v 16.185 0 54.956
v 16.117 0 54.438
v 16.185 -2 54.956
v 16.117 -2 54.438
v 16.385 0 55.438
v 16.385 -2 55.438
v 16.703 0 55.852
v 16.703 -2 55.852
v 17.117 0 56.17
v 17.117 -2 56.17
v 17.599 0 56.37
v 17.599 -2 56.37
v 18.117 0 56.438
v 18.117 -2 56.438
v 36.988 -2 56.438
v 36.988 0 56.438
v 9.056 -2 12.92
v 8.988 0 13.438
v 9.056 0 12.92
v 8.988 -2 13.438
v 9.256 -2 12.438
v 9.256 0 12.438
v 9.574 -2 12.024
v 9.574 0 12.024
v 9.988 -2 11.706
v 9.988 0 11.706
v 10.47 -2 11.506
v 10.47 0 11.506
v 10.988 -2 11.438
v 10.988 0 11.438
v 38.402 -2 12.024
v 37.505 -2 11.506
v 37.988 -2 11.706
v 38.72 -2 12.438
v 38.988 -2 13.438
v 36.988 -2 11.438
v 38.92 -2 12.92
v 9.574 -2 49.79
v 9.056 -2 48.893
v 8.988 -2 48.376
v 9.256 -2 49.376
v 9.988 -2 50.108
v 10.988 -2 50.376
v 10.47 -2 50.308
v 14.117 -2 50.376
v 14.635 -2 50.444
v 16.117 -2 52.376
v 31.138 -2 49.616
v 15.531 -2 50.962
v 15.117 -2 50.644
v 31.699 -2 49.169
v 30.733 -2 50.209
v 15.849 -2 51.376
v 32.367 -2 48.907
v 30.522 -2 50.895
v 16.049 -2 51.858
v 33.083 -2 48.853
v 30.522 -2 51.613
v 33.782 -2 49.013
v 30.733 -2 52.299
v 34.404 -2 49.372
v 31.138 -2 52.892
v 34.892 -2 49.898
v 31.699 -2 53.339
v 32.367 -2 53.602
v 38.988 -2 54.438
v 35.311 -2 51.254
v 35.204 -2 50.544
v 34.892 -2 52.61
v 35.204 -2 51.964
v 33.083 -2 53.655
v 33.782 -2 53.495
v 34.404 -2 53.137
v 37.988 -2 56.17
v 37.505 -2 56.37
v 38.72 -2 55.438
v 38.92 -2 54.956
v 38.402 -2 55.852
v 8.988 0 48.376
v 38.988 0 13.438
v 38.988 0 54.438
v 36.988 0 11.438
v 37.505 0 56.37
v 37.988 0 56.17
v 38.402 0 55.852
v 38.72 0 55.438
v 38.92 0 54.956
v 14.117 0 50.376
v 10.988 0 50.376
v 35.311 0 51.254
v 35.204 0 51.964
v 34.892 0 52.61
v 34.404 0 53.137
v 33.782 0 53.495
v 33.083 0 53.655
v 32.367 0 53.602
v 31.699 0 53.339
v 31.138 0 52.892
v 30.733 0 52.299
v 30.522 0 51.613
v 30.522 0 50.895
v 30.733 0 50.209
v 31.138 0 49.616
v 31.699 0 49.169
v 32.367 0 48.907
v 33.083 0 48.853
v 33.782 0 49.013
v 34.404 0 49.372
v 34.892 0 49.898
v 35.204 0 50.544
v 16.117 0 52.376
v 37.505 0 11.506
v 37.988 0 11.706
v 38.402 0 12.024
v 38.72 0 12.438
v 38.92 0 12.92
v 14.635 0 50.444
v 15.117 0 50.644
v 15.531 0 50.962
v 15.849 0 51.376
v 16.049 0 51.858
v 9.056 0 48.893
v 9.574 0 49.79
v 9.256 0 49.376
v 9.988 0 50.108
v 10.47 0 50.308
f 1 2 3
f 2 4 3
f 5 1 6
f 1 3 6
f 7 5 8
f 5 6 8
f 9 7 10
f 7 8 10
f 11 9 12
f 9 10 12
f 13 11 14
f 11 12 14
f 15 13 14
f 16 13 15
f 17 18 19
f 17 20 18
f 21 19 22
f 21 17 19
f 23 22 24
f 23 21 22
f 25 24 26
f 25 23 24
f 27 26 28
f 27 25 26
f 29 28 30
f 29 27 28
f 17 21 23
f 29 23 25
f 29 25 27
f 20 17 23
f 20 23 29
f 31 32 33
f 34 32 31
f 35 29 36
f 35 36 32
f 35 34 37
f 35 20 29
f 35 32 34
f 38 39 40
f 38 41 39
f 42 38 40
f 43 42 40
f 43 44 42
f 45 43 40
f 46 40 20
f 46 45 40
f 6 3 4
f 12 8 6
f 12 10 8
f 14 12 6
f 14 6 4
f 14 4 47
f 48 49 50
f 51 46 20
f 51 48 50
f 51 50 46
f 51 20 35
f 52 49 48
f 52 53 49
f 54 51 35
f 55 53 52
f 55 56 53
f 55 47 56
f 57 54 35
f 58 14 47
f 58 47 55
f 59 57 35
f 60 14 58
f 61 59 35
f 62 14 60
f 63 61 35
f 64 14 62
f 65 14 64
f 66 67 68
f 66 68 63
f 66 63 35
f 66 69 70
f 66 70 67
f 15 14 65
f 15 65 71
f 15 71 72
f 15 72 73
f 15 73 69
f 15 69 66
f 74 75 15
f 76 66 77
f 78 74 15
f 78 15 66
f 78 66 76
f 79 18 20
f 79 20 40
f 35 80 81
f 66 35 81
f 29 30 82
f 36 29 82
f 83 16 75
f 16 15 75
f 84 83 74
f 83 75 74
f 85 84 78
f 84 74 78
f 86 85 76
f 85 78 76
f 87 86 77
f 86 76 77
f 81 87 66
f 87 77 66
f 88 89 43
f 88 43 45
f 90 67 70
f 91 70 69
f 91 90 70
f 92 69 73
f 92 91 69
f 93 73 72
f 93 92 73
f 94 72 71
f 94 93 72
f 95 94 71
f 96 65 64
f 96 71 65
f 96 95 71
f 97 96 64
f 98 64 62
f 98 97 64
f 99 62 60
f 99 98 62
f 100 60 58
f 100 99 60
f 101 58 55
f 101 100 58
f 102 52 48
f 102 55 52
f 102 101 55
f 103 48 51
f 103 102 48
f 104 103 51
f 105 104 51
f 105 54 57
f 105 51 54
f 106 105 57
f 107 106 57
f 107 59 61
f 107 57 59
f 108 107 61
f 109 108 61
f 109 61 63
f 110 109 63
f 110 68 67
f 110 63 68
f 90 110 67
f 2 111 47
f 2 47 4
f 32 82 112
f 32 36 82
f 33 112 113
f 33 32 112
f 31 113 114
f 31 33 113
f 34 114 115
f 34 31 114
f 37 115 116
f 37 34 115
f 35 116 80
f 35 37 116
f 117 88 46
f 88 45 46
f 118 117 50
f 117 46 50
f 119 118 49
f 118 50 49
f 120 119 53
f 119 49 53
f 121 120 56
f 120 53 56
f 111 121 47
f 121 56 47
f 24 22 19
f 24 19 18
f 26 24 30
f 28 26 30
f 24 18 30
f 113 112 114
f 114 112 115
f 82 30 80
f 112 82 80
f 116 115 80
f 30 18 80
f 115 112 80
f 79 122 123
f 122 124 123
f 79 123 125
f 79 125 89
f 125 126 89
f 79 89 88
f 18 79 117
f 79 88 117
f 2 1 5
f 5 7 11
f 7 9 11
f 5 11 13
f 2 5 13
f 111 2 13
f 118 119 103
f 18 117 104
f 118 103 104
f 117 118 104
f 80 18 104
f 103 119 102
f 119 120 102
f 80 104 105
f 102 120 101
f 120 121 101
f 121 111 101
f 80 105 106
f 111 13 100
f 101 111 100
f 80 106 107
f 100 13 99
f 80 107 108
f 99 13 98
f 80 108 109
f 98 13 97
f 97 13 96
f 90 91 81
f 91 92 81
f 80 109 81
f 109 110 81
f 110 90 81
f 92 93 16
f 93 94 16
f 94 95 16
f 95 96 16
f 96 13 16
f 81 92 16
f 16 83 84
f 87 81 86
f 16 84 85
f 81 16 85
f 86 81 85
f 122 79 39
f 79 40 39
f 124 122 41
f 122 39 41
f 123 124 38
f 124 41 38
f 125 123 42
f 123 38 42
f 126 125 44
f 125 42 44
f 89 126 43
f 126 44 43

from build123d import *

# Parameters (mm, degrees)
F0_W     = 30
F0_H     = 45
F1_DEPTH = 2
F2_W     = 7.129192
F2_H     = 6.062236
F2_R     = 2.40786
F3_DEPTH = 2.001
F4_R     = 2


with BuildPart() as f1:
    # F0 (on Front) → F1 (new body)
    with BuildSketch(Plane.XZ):
        with Locations((23.987818, 33.938015)):
            Rectangle(F0_W, F0_H)
    extrude(amount=F1_DEPTH)

    # F2 (on Front) → F3 (cut, through all)
    with BuildSketch(Plane.XZ):
        with Locations((12.552414, 53.406897)):
            Rectangle(F2_W, F2_H)
        with Locations((32.902706, 51.254064)):
            Circle(F2_R)
    extrude(amount=F3_DEPTH, mode=Mode.SUBTRACT)

    # F4
    f4_edges = [f1.edges().sort_by_distance(p)[0] for p in [
        (8.987818, -1, 50.375779),
        (16.11701, -1, 50.375779),
        (16.11701, -1, 56.438015),
        (38.987818, -1, 56.438015),
        (38.987818, -1, 11.438015),
        (8.987818, -1, 11.438015),
    ]]
    fillet(f4_edges, radius=F4_R)


solid = f1.part
